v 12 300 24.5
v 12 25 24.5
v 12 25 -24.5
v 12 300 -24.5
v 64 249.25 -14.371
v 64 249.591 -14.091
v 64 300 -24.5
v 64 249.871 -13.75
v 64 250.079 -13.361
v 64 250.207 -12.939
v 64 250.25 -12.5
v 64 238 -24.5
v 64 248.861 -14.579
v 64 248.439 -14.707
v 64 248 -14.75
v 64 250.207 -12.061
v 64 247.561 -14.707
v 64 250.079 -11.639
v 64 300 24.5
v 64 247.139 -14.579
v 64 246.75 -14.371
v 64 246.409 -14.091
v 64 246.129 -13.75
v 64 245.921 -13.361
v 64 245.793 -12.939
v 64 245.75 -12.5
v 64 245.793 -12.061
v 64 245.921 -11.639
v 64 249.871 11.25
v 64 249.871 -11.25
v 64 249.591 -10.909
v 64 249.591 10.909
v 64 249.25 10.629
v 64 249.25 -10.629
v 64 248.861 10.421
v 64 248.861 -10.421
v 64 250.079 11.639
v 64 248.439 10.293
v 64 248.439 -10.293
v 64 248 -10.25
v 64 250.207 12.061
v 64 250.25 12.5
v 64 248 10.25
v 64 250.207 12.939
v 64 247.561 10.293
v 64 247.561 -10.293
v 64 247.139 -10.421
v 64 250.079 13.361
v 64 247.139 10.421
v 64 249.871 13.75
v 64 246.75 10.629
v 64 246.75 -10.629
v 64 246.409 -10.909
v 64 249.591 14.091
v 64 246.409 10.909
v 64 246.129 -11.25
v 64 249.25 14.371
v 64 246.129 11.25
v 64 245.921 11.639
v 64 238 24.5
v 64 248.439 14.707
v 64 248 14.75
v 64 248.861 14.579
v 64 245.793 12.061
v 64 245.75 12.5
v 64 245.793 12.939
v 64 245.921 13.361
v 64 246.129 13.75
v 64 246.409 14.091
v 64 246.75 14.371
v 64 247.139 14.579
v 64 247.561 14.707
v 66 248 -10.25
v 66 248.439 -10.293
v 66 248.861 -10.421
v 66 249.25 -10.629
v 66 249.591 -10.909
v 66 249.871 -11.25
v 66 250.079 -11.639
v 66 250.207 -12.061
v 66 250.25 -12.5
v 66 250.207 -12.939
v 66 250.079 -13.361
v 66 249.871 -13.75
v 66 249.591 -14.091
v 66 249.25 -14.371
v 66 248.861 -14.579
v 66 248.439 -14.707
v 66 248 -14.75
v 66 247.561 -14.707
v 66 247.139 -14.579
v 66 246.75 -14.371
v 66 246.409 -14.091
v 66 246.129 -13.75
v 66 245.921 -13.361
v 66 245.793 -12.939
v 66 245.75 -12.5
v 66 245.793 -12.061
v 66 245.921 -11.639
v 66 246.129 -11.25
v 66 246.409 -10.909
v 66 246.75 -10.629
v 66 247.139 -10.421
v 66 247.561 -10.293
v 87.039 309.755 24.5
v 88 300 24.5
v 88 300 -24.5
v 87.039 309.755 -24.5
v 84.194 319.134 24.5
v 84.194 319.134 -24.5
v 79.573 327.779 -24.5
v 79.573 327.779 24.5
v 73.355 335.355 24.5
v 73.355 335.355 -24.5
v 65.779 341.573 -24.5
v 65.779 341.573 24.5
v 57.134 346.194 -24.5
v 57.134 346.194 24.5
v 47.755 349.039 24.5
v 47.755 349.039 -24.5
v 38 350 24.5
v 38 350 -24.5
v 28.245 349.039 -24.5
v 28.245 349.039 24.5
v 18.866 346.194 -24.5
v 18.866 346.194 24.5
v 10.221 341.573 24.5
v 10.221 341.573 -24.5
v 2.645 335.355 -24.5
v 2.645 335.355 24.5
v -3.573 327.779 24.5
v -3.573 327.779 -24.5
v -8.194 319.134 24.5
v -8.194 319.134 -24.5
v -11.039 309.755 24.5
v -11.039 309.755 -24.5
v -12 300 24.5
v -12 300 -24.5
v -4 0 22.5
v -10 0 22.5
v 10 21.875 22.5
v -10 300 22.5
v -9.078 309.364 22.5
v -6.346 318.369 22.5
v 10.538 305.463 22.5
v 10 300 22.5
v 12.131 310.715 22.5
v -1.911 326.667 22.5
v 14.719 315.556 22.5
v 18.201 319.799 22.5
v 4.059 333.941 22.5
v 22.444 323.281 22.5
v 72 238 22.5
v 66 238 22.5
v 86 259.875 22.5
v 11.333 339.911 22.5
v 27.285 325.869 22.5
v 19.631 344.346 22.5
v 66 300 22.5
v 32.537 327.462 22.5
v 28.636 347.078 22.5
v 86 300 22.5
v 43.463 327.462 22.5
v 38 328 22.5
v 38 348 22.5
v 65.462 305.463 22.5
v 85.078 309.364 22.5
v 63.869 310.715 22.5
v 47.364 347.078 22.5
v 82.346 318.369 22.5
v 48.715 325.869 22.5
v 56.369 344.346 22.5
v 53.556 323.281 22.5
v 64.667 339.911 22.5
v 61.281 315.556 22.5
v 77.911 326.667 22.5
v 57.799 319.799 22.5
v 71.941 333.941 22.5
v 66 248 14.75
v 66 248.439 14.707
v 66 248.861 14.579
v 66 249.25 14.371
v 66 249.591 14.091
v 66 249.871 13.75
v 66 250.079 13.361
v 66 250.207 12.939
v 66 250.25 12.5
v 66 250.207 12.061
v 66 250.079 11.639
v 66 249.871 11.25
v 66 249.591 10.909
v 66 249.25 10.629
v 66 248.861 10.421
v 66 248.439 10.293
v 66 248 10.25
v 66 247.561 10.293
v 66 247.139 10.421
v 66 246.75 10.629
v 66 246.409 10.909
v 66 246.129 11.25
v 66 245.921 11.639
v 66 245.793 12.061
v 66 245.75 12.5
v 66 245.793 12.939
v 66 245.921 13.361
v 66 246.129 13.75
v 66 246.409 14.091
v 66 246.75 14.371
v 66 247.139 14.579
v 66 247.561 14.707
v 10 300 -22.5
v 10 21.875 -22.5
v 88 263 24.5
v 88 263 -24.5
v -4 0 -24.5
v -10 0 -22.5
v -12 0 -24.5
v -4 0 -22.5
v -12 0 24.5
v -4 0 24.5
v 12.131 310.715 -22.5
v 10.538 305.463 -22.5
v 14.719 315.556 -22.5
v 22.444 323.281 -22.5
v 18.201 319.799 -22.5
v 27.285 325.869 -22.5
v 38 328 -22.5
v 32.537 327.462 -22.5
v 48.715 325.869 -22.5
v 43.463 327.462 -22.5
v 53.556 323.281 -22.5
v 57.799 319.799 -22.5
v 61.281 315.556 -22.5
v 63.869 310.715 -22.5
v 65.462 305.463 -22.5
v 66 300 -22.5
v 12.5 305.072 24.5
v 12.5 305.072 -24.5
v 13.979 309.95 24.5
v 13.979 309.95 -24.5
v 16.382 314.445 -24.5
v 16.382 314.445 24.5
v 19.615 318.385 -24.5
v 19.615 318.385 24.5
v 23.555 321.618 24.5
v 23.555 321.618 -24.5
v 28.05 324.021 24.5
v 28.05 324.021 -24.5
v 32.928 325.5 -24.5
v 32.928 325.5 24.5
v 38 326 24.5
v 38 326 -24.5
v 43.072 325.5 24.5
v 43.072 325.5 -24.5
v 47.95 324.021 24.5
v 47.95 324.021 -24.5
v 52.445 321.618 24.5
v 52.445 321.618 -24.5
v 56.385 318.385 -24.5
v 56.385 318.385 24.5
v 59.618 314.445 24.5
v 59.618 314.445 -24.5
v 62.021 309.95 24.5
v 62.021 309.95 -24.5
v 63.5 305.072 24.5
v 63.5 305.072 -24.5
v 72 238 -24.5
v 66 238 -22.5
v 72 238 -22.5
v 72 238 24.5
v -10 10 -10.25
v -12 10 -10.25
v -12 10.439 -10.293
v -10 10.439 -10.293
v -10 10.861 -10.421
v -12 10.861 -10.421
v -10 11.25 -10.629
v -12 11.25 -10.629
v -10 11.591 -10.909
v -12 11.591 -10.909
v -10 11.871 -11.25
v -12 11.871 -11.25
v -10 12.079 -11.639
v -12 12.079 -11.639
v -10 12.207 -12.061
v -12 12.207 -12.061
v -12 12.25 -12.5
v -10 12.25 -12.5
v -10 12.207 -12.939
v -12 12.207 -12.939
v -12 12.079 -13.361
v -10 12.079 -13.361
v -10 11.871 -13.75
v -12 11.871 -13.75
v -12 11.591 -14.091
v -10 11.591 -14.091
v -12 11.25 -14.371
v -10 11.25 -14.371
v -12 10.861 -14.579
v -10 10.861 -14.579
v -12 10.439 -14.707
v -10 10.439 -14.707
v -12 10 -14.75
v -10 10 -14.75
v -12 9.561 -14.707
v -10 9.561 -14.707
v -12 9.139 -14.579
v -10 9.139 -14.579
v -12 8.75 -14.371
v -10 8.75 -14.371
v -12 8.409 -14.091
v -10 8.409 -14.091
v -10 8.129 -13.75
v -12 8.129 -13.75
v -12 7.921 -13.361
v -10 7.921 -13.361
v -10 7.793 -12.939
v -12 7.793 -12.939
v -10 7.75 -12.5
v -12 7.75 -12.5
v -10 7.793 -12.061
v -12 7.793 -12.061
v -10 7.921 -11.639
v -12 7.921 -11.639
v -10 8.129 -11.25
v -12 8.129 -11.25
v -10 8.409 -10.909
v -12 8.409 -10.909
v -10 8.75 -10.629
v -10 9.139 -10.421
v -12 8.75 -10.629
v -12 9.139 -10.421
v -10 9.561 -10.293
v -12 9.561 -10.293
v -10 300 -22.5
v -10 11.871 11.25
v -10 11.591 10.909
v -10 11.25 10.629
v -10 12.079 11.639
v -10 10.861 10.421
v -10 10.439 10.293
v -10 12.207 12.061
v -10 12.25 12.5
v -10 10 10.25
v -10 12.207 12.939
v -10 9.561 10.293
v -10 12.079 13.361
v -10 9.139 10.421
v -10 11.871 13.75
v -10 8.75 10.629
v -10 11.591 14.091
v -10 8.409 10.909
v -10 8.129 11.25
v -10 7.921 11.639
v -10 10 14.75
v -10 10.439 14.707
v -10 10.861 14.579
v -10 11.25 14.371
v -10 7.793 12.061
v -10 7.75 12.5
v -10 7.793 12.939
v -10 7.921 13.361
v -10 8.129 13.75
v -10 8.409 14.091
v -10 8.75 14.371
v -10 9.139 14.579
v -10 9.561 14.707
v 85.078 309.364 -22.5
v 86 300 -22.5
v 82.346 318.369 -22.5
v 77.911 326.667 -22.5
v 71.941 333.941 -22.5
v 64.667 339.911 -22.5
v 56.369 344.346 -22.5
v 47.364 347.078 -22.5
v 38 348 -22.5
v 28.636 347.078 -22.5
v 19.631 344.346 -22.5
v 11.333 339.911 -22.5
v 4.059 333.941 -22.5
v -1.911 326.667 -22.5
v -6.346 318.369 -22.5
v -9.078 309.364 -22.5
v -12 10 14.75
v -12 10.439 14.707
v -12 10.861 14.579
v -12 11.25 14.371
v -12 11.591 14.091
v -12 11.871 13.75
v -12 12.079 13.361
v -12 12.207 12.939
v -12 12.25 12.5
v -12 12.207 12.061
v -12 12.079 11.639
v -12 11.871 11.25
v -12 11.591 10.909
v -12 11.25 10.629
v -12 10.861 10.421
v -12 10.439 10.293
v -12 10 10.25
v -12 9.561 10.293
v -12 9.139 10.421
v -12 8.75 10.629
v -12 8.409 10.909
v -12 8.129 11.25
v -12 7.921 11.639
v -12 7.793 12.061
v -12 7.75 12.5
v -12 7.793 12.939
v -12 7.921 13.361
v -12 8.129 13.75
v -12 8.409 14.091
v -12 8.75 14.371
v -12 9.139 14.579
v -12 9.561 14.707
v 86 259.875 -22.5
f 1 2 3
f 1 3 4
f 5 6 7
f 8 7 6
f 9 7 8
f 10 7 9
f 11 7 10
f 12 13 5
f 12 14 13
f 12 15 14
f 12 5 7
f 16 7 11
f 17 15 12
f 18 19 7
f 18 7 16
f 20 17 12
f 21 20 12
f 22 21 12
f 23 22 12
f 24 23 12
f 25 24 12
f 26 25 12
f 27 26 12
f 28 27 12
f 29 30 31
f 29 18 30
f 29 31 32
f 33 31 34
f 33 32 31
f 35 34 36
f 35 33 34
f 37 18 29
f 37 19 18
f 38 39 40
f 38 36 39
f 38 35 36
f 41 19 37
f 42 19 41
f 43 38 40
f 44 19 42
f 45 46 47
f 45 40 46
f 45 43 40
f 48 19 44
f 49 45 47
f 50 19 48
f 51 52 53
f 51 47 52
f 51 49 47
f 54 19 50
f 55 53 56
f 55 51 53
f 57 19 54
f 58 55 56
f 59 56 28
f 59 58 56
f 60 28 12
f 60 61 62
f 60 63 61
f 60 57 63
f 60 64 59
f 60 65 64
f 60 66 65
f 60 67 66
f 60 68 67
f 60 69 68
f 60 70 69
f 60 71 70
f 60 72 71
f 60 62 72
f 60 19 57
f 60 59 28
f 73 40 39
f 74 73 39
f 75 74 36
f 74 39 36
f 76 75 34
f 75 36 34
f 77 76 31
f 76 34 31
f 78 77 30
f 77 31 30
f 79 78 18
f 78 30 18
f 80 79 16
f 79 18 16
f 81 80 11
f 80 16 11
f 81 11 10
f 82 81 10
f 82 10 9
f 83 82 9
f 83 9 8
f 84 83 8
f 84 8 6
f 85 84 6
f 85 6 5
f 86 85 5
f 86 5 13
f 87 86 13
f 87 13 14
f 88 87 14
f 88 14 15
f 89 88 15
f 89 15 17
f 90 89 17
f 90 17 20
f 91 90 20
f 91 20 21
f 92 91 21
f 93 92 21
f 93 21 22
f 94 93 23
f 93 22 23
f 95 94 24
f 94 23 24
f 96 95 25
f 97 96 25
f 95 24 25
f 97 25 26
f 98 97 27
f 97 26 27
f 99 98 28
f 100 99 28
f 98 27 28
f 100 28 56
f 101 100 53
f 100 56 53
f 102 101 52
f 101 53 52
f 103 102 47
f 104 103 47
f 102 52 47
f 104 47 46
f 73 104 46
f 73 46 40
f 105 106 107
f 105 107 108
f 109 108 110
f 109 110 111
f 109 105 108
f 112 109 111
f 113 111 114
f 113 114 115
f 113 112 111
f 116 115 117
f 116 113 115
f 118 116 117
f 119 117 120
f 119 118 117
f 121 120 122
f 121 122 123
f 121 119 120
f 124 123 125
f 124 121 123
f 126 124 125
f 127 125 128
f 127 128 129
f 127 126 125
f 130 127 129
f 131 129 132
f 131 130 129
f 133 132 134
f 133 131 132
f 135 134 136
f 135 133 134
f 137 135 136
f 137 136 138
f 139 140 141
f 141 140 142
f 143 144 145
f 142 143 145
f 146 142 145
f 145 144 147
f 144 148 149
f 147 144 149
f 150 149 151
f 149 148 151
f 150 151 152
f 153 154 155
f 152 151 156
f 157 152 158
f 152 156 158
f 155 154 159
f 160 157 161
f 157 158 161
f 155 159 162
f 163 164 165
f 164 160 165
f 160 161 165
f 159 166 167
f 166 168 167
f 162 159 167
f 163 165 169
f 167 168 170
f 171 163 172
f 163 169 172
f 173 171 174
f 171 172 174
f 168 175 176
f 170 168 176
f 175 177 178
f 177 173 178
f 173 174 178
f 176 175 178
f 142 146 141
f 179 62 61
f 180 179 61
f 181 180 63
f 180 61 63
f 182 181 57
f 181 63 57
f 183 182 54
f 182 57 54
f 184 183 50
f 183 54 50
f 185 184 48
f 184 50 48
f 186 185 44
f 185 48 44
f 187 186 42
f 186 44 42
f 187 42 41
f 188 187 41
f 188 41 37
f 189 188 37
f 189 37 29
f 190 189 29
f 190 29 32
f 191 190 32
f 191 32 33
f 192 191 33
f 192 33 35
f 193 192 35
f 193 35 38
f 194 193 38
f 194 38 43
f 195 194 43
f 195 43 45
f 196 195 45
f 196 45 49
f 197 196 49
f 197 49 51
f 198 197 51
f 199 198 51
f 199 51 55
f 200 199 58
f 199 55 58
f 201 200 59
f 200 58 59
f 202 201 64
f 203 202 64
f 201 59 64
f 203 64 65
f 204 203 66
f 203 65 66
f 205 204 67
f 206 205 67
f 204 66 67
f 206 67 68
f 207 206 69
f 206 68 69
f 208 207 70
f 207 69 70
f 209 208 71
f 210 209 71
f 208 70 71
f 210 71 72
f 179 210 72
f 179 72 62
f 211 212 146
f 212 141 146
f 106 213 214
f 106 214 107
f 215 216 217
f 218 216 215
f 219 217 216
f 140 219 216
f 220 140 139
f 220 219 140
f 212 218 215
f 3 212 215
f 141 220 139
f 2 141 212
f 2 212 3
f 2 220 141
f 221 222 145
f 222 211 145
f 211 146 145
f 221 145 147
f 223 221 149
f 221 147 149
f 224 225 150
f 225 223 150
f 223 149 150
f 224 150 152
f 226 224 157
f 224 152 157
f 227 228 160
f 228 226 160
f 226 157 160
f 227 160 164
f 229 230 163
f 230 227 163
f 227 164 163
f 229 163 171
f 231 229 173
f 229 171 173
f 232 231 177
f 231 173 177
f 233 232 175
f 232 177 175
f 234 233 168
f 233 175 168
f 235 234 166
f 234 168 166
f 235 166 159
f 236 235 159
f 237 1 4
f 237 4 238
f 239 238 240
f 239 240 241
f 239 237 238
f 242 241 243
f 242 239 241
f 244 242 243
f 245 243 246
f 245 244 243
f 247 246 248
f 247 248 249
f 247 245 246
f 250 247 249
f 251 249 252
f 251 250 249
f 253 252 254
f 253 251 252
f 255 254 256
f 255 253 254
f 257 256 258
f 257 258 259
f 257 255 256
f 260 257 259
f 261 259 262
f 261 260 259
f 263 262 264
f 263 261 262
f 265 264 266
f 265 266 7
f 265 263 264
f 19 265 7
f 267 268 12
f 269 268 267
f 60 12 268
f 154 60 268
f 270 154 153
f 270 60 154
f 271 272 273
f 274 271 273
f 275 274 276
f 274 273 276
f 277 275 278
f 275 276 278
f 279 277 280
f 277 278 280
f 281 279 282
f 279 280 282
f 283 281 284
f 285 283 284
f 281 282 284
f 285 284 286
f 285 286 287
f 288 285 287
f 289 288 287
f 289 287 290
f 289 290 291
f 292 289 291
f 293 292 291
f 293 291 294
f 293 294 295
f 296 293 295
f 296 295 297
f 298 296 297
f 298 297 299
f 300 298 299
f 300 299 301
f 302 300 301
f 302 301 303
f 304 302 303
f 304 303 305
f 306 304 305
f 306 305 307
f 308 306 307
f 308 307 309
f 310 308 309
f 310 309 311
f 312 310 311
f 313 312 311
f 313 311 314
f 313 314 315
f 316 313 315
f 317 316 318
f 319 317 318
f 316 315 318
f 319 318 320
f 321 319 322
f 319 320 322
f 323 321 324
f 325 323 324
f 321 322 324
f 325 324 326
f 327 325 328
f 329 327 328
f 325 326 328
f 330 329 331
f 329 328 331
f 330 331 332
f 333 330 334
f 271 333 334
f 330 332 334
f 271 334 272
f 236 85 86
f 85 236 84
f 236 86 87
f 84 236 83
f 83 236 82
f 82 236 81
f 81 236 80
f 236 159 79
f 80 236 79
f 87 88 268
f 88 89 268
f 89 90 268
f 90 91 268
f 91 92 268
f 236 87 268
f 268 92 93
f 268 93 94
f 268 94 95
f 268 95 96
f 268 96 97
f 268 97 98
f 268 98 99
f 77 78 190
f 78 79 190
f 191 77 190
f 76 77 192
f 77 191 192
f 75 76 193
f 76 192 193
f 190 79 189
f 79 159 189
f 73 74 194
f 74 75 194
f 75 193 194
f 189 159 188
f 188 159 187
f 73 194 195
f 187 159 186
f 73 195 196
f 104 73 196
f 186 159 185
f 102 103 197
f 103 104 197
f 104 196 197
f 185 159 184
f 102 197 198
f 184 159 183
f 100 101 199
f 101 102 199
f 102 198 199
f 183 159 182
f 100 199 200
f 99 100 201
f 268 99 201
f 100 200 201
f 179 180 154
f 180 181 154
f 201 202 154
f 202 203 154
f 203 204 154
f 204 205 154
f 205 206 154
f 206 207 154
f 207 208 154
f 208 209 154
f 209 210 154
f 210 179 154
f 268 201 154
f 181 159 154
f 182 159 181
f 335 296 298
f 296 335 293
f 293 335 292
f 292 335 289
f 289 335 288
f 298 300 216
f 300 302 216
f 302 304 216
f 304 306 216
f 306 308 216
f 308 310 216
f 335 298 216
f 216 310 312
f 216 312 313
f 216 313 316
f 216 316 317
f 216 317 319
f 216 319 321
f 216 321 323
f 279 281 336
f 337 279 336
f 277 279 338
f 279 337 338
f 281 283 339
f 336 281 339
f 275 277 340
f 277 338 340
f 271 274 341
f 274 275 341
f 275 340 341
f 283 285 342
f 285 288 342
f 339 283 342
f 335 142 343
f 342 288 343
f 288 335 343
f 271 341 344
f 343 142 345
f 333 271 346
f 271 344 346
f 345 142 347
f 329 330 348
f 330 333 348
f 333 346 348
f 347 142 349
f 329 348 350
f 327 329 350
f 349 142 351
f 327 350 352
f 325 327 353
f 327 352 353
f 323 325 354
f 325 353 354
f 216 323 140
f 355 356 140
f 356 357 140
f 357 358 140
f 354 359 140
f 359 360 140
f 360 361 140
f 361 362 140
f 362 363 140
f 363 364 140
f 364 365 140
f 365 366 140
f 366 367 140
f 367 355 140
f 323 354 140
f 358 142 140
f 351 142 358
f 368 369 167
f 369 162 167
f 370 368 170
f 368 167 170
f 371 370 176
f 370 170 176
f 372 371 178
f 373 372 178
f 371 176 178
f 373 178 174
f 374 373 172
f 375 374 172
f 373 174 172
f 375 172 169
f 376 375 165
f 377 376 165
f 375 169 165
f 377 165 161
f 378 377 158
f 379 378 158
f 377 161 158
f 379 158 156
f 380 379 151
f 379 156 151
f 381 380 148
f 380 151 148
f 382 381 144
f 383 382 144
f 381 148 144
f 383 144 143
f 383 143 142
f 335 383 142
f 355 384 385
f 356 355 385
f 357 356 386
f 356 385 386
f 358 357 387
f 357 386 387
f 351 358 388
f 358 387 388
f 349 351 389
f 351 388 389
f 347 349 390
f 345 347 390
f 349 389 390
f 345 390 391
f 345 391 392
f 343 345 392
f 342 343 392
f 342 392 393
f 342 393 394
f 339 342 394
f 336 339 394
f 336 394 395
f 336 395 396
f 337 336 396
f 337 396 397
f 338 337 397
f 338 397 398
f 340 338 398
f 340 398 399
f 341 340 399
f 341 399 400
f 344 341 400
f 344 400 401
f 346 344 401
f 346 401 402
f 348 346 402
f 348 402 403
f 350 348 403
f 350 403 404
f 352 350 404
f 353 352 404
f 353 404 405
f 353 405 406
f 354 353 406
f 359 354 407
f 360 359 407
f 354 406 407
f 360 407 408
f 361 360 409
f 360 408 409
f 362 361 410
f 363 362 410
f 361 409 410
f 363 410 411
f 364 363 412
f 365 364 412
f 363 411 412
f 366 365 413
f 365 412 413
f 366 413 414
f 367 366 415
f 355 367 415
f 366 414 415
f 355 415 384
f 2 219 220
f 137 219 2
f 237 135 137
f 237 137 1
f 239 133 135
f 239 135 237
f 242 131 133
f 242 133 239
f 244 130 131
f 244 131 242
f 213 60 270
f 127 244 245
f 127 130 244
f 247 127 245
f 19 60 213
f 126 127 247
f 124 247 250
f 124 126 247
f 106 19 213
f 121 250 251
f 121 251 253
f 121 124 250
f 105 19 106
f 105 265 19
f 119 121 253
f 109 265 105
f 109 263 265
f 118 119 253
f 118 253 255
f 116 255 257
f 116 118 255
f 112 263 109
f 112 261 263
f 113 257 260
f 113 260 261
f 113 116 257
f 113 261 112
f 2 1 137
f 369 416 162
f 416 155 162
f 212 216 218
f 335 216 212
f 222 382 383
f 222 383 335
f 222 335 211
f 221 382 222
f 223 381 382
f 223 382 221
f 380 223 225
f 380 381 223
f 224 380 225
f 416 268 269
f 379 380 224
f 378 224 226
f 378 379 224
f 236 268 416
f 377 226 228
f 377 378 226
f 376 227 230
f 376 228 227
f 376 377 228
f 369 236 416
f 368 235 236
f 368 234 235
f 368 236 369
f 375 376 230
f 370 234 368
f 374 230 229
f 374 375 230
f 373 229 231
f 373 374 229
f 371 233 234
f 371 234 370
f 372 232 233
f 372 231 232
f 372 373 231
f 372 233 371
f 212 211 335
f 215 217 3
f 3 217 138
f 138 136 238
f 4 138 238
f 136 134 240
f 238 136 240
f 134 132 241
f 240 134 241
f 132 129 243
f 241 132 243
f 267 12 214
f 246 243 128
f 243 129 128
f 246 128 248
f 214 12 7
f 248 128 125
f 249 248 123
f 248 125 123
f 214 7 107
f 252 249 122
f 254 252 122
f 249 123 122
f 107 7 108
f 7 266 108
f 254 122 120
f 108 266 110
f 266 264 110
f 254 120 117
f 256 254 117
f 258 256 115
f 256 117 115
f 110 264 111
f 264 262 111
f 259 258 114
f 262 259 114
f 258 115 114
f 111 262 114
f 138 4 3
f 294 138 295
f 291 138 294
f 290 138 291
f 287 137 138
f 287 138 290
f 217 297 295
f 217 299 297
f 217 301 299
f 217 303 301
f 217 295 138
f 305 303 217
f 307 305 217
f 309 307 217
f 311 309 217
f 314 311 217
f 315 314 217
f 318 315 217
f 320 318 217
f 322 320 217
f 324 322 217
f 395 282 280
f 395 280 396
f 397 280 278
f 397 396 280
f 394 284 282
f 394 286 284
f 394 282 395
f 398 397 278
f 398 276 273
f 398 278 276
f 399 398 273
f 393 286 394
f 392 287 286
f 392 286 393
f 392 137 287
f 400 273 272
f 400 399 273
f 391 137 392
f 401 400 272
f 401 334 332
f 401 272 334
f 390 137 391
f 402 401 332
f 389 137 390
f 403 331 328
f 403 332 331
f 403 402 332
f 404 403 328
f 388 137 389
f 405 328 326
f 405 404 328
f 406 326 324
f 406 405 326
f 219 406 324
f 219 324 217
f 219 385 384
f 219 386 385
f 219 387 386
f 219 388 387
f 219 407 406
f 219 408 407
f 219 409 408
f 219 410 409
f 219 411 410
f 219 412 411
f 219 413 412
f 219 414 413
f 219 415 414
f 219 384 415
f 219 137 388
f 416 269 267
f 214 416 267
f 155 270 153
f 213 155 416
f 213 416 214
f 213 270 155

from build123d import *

# Parameters (mm, degrees)
EXTRUDE_1_DEPTH        = 24.5
SHELL_1_T              = -2
CUT_EXTRUDE_1_DEPTH    = 365.204612821
HOLE_WIZARD_M4_1_D     = 4.5
HOLE_WIZARD_M4_2_D     = 4.5
HOLE_WIZARD_M4_2_DEPTH = 2


with BuildPart() as part:
    # 草图1 → 拉伸-薄壁1 (new, symmetric)
    with BuildSketch(Plane.XY):
        with BuildLine():
            Line((12, 0), (12, 300))
            ThreePointArc((12, 300), (38, 326), (64, 300))
            Line((64, 300), (64, 238))
            Line((64, 238), (88, 238))
            Line((88, 238), (88, 300))
            ThreePointArc((88, 300), (38, 350), (-12, 300))
            Line((-12, 300), (-12, 0))
            Line((-12, 0), (12, 0))
        make_face()
    extrude(amount=EXTRUDE_1_DEPTH, both=True)

    # 抽壳1
    shell_1_openings = [part.faces().sort_by_distance(p)[0] for p in [
        (0, 0, 0),
        (76, 238, 0),
    ]]
    offset(amount=SHELL_1_T, openings=shell_1_openings, kind=Kind.INTERSECTION)

    # 草图2 → 切除-拉伸1 (cut, through all)
    with BuildSketch(Plane.XY.offset(24.5)):
        Polygon((88, 263), (88, 238), (72, 238), align=None)
        Polygon((12, 25), (12, 0), (-4, 0), align=None)
    extrude(amount=-CUT_EXTRUDE_1_DEPTH, mode=Mode.SUBTRACT)

    # M4 间隙孔1 (through all)
    with Locations(Plane(origin=(-10, 0, 0), x_dir=(0, 0, -1), z_dir=(1, 0, 0))):
        with Locations((12.5, 10), (-12.5, 10)):
            Hole(HOLE_WIZARD_M4_1_D / 2)

    # M4 间隙孔2
    with Locations(Plane(origin=(66, 0, 0), x_dir=(0, 0, -1), z_dir=(1, 0, 0))):
        with Locations((12.5, 248), (-12.5, 248)):
            Hole(HOLE_WIZARD_M4_2_D / 2, depth=HOLE_WIZARD_M4_2_DEPTH)


solid = part.part
